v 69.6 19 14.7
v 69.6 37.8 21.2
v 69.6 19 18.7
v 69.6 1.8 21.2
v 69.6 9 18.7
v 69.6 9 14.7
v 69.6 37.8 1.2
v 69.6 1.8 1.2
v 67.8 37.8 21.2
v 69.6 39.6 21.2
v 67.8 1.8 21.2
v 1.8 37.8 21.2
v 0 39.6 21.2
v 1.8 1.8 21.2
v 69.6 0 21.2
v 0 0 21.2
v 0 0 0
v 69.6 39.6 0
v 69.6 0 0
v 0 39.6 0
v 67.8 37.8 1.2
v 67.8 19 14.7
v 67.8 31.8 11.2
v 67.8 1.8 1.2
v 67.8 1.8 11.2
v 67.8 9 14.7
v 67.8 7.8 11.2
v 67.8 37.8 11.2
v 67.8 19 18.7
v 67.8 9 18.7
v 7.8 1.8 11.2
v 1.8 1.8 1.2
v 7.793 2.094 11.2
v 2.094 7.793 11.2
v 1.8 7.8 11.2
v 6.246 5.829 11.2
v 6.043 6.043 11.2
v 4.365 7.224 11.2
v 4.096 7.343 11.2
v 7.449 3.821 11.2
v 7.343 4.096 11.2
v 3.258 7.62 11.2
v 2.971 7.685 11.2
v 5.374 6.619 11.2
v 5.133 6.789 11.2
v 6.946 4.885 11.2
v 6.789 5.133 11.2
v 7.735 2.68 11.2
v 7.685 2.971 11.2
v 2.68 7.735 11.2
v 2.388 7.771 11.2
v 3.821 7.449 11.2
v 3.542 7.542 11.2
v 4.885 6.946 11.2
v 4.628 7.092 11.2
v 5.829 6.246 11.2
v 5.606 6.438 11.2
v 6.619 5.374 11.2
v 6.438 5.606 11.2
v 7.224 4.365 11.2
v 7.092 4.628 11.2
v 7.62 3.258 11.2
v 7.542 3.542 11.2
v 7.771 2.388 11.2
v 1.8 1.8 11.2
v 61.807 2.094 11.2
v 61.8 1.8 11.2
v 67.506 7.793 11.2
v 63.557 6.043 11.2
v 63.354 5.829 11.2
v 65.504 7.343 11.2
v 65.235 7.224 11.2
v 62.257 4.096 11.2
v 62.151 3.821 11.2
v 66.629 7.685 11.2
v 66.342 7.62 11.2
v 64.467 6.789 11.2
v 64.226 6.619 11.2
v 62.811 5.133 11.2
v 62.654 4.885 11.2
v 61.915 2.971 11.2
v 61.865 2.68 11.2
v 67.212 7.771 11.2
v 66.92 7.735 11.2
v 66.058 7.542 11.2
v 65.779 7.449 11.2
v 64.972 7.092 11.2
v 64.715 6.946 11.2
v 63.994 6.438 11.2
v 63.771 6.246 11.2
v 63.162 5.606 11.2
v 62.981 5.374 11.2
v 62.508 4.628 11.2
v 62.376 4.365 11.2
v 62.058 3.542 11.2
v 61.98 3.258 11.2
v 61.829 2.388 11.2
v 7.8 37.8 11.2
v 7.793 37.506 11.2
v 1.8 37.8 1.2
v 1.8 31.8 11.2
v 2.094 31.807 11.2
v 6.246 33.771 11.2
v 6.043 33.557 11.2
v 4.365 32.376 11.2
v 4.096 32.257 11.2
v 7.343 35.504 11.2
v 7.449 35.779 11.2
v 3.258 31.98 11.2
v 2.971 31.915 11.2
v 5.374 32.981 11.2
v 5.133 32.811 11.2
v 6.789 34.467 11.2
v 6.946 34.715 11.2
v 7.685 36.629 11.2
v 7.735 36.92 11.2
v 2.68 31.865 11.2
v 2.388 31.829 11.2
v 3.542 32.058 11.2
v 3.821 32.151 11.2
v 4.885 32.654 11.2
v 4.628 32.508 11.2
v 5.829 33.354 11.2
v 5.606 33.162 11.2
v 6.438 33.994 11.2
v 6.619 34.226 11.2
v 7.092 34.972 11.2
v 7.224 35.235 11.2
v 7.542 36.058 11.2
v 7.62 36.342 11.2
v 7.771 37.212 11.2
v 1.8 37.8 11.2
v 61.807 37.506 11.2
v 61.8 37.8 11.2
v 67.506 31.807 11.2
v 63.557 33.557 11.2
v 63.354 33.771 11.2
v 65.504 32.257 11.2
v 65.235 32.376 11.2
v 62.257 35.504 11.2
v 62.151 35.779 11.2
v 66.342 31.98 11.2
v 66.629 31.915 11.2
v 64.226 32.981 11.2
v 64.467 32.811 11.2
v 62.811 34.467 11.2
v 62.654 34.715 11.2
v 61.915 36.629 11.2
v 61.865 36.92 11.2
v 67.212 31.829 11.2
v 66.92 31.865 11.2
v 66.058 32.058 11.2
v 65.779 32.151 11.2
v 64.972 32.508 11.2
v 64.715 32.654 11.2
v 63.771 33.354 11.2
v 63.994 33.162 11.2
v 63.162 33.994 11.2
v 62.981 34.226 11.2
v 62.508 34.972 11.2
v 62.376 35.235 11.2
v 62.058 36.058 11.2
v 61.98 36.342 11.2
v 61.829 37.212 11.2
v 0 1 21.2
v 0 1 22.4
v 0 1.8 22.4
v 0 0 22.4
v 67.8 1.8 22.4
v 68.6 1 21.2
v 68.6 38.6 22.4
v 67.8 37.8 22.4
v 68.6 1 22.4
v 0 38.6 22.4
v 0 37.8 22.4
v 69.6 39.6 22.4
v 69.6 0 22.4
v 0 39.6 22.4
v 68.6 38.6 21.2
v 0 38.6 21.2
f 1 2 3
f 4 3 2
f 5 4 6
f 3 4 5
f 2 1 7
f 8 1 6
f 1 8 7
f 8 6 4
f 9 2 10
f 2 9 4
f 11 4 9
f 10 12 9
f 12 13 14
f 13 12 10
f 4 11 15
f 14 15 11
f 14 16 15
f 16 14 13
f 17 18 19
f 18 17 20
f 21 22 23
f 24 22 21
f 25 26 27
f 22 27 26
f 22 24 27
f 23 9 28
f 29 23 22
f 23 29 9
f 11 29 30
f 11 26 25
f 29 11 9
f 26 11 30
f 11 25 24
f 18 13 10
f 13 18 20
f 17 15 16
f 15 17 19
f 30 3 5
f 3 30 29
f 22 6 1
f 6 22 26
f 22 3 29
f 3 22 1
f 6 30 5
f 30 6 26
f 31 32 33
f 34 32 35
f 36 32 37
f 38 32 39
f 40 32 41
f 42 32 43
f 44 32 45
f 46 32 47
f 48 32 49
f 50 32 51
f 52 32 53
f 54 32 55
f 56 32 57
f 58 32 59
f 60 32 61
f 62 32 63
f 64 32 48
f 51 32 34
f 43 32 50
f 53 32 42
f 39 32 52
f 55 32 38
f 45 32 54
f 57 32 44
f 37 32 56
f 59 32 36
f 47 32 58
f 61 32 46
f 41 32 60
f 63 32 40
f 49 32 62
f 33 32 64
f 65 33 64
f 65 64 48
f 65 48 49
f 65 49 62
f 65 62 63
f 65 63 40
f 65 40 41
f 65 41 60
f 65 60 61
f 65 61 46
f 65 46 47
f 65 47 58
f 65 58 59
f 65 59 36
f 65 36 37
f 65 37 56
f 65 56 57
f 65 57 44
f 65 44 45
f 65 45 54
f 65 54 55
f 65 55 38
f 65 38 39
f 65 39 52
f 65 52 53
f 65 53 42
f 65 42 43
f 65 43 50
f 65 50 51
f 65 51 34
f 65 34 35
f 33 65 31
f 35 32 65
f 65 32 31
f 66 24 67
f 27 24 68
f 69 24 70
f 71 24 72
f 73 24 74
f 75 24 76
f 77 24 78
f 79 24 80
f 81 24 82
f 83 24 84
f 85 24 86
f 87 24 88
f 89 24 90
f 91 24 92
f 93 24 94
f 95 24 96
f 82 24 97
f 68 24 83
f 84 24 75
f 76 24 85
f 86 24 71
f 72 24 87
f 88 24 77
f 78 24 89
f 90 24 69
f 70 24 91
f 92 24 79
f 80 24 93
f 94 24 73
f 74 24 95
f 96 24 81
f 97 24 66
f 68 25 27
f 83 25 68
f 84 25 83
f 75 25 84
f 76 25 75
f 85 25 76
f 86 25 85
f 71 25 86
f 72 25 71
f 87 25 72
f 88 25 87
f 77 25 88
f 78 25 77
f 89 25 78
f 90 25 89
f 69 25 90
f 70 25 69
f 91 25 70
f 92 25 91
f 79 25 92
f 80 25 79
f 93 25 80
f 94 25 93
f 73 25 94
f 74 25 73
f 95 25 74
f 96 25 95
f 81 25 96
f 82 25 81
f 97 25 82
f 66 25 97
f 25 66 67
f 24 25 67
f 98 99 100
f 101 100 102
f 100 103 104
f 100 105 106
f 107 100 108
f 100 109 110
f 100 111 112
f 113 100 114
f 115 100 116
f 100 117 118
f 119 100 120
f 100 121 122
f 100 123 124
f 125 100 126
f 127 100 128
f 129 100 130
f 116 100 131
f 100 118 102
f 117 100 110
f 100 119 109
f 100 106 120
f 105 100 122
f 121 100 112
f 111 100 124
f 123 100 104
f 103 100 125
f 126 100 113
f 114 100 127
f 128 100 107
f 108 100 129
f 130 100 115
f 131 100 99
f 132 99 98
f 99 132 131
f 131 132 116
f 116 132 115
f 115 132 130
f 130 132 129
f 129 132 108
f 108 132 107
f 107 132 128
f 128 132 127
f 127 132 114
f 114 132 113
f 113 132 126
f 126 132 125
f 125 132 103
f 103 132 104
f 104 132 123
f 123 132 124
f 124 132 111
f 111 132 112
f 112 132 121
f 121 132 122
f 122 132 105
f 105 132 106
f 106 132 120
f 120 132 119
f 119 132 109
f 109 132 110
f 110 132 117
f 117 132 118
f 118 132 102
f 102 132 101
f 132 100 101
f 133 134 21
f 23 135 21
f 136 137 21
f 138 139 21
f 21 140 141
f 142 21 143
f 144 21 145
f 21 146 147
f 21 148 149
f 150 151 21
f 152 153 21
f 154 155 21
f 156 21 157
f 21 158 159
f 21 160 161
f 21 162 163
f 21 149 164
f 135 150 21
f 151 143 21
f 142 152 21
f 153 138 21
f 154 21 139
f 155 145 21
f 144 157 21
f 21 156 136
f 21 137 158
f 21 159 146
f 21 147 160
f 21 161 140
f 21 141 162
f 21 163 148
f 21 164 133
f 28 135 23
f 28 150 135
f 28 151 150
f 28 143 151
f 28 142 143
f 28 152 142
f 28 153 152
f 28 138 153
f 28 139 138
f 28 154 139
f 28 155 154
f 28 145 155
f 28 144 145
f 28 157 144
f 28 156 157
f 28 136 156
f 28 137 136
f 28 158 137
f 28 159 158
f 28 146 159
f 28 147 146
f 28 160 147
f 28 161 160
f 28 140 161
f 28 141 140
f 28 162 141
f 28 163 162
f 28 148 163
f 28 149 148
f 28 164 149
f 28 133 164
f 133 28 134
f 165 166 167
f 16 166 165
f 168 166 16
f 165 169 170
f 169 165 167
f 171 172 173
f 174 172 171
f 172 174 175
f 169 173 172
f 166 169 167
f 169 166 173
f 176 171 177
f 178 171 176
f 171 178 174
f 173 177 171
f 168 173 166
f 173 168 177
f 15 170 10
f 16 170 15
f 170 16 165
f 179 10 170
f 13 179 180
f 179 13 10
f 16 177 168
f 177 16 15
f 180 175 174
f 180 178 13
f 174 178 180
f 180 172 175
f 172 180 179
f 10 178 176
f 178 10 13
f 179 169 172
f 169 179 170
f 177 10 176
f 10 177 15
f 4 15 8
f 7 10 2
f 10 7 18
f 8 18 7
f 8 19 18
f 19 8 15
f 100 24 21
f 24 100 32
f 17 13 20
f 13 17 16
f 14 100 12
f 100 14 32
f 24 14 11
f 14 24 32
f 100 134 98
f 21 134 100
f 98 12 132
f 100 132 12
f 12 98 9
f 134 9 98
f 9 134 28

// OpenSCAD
layerHeight = 0.3;
verticalThickness = 4 * layerHeight;

inkplateBoardWidth = 65.2 + 0.8;
inkplateBoardHeight = 35.3 + 0.7;
inkplateBoardThickness = 9.9 + 0.1;

inkplateBoardLift = 10;
lifterRadius = 6;

display = [50, 26];
displayRightPadding = 4.5;
displayBottomPadding = 4.5;

usbWidth = 10; // 12 for whole plug
usbHeight = 4; // 7 for whole plug
usbYOffset = 7.2;
usbZOffset = 3.5;

capTolerance = 0.2;
capRailMinThickness = 1.0;
capRailLockSize = 0.8;
capLockWidth = 4;
capLockLength = 2;
capLockHeight = 0.6;

wallThickness = capRailMinThickness + capRailLockSize;
caseWidth = inkplateBoardWidth + 2 * wallThickness;
caseDepth = inkplateBoardHeight + 2 * wallThickness;
caseHeight = inkplateBoardLift + inkplateBoardThickness + 2 * verticalThickness;

$fn = $preview ? 32 : 128;

module mainCase() {
    // floor
    cube([caseWidth, caseDepth, verticalThickness]);
    
    // left
    cube([wallThickness, caseDepth, caseHeight - verticalThickness]);       
    
    // right
    translate([caseWidth - wallThickness, 0, 0])
    difference() {
        cube([wallThickness, caseDepth, caseHeight - verticalThickness]);
        
        translate([-0.01, wallThickness + usbYOffset, verticalThickness + inkplateBoardLift + usbZOffset])
        cube([wallThickness + 0.02, usbWidth, usbHeight]);
    }
        
    
    // front
    cube([caseWidth, wallThickness, caseHeight - verticalThickness]);
    
    // back
    translate([0, caseDepth - wallThickness, 0])
    cube([caseWidth, wallThickness, caseHeight - verticalThickness]);
    
    // Lifter FL
    translate([wallThickness, wallThickness, verticalThickness])
    lifter();
    
    // Lifter FR
    translate([caseWidth - wallThickness, wallThickness, verticalThickness])
    scale([-1, 1, 1])
    lifter();
    
    // Lifter BL
    translate([wallThickness, caseDepth - wallThickness, verticalThickness])
    scale([1, -1, 1])
    lifter();
    
    // Lifter BR
    translate([caseWidth - wallThickness, caseDepth - wallThickness, verticalThickness])
    scale([-1, -1, 1])
    lifter();
    
    // front rail
    translate([0, 0, caseHeight - verticalThickness]) {
        capRail(caseWidth);
    }
    
    // back rail
    translate([0, caseDepth, caseHeight - verticalThickness])
    scale([1, -1, 1]) {
        capRail(caseWidth);
    }
    
    // right rail
    translate([caseWidth, 0, caseHeight - verticalThickness])
    rotate(90) {
        capRail(caseDepth);
    }
}

module capRail(length) {
    translate([0, capRailMinThickness, 0])
    cushion(length, verticalThickness, capRailLockSize);
    
    cube([length, capRailMinThickness, verticalThickness]);
}

module cushion(thickness, height, width) {
    rotate([90, 0, 90])
    linear_extrude(thickness)
    polygon([
        [0, height],
        [0, 0],
        [width, height],
        
    ]);
}

module lifter() {
    intersection() {
        cylinder(h = inkplateBoardLift, r1 = 0, r2 = lifterRadius);
        
        cube([lifterRadius, lifterRadius, inkplateBoardLift]);
    }
}

module displayCap() {
    topWidth = caseDepth - 2 * (capRailMinThickness + capTolerance);
    topLength = caseWidth - (capRailMinThickness + capTolerance);
    
    difference() {
        hull() {
            translate([0, 0, verticalThickness - 0.01])
            cube([topLength, topWidth, 0.01]);
            
            translate([capRailLockSize, capRailLockSize, 0])
            cube([topLength - capRailLockSize, topWidth - 2 * capRailLockSize, 0.01]);
        }
        
        translate([capRailLockSize + displayRightPadding, capRailLockSize + displayBottomPadding, -0.01])
        cube([display.x, display.y, verticalThickness + 0.02]);
    }
    
    translate([topLength - capLockLength - wallThickness - 2 * capTolerance, (topWidth - capLockWidth) / 2, verticalThickness])
    cube([capLockLength, capLockWidth, capLockHeight]);
}

module testAssembly() {
    cutPosition = 0.9;
    intersection() {
        union() {
            mainCase();
            
            translate([caseWidth, 0, caseHeight])
            rotate([0, 180, 0])
            translate([capRailMinThickness + capTolerance, capRailMinThickness + capTolerance, -capTolerance / 2])
            displayCap();
        }
        
        translate([0, 0, 0])
        cube([caseWidth, caseDepth * cutPosition, caseHeight]);
    }
}

module printLayout() {
    mainCase();
    
    translate([0, caseDepth + 10, 0])
    displayCap();
}

mainCase();
